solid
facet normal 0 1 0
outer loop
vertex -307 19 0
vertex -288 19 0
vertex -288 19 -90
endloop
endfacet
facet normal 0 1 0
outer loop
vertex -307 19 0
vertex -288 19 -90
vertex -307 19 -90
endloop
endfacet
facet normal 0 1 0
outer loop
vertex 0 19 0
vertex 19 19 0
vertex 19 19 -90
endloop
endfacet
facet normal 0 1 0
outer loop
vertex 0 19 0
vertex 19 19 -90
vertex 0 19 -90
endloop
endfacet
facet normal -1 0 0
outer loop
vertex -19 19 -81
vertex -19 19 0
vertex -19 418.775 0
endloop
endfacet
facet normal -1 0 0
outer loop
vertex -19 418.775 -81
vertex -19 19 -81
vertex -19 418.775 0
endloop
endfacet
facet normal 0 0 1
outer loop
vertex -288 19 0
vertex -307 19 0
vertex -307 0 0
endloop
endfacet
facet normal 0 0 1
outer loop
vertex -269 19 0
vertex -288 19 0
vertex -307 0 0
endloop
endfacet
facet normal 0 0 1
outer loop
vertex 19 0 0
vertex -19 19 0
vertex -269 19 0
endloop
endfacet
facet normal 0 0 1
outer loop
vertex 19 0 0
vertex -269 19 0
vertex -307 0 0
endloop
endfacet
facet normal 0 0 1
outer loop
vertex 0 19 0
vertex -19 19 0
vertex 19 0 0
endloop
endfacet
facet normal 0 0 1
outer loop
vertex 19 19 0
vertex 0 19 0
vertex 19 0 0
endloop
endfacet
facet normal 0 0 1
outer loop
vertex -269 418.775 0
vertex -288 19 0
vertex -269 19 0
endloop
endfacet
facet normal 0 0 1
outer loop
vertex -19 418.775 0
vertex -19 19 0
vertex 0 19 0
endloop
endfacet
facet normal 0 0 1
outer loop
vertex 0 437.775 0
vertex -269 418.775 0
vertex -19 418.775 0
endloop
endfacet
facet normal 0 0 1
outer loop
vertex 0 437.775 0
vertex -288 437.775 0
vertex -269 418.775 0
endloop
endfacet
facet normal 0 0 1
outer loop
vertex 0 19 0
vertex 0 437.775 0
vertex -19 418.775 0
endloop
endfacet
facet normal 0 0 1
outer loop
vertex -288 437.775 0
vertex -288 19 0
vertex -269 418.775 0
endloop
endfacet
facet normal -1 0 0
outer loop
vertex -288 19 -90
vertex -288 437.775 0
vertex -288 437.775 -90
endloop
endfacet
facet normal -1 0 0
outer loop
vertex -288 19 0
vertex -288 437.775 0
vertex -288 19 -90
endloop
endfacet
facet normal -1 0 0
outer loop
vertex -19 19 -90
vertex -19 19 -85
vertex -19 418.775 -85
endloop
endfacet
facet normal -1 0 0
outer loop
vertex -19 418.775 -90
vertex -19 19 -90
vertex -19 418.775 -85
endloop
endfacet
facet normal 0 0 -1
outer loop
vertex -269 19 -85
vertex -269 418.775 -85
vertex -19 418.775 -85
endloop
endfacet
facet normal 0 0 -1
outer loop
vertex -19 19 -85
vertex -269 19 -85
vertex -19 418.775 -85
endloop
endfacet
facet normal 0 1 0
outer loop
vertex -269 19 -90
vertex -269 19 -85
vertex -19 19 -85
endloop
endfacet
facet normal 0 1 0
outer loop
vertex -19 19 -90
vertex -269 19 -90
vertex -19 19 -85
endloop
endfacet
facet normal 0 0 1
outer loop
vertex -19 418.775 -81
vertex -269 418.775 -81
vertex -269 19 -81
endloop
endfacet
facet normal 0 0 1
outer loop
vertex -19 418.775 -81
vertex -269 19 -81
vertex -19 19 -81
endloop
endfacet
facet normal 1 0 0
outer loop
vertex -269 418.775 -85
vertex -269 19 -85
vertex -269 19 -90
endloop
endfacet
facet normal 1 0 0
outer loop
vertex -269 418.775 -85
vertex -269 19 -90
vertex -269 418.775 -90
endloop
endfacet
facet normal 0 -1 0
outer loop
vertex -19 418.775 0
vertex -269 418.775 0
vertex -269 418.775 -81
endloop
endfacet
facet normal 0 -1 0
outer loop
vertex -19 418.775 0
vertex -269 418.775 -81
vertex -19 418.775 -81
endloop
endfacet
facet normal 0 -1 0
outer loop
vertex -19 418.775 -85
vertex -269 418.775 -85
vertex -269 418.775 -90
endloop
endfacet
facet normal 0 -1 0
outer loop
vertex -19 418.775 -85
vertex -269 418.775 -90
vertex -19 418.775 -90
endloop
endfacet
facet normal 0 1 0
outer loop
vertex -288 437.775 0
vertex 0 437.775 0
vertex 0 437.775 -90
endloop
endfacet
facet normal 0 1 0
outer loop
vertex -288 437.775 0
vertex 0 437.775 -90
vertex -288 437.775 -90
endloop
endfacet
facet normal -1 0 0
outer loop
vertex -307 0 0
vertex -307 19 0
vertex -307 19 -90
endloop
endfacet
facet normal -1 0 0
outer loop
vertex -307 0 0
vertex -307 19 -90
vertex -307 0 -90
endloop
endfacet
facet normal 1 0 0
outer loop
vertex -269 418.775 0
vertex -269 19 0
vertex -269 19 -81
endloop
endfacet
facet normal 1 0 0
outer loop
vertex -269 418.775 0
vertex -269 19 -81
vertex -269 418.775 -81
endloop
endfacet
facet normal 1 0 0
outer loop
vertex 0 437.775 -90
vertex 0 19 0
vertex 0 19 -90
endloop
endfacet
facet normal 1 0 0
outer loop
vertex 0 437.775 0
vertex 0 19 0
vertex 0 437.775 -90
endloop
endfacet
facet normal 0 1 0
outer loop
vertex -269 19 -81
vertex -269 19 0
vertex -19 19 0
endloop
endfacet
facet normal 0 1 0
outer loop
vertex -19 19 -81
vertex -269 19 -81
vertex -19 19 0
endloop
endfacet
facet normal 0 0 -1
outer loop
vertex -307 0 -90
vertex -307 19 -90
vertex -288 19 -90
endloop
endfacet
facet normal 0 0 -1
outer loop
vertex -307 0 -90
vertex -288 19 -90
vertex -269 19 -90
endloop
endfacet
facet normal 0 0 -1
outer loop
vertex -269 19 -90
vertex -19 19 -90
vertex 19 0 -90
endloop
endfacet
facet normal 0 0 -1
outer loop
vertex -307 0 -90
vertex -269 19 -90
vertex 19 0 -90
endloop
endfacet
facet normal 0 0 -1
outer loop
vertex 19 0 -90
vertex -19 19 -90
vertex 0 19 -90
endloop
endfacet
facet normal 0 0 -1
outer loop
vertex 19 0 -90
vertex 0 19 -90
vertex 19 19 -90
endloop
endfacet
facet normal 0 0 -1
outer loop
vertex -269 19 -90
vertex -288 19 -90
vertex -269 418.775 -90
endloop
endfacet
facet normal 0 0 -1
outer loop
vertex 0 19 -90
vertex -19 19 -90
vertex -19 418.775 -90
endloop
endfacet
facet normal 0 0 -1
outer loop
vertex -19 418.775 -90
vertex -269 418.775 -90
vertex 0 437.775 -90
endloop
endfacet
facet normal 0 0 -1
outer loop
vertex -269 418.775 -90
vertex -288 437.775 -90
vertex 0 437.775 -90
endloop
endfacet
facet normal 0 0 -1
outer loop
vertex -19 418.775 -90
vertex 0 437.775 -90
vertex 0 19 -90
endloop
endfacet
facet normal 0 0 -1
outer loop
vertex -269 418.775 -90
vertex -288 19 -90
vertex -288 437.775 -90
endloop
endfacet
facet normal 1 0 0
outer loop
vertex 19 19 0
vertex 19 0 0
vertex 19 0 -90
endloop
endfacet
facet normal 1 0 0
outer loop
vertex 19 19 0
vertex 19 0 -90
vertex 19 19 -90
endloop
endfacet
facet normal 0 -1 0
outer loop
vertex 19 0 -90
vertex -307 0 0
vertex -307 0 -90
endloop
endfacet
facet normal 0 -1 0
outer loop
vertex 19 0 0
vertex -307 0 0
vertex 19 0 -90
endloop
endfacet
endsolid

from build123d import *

# Parameters (mm, degrees)
F0_W     = 250
F0_H     = 399.7749028206
F1_DEPTH = 90
F3_W     = 250
F3_H     = 413
F4_DEPTH = 4


with BuildPart() as f1:
    # F0 (on Top) → F1 (new body)
    with BuildSketch(Plane.XY):
        Polygon((-288, 0), (0, 0), (19, 0), (19, 15.7749028206), (19, 19), (0, 19), (0, 418.7749028206), (0, 437.7749028206), (-288, 437.7749028206), (-288, 19), (-307, 19), (-307, 0), align=None)
        with Locations((-144, 218.8874514103)):
            Rectangle(F0_W, F0_H, mode=Mode.SUBTRACT)
    extrude(amount=-F1_DEPTH)

    # F3 (on offset) → F4 (join)
    with BuildSketch(Plane.XY.offset(-85)):
        with Locations((-144, 225.5)):
            Rectangle(F3_W, F3_H)
    extrude(amount=F4_DEPTH)


solid = f1.part
